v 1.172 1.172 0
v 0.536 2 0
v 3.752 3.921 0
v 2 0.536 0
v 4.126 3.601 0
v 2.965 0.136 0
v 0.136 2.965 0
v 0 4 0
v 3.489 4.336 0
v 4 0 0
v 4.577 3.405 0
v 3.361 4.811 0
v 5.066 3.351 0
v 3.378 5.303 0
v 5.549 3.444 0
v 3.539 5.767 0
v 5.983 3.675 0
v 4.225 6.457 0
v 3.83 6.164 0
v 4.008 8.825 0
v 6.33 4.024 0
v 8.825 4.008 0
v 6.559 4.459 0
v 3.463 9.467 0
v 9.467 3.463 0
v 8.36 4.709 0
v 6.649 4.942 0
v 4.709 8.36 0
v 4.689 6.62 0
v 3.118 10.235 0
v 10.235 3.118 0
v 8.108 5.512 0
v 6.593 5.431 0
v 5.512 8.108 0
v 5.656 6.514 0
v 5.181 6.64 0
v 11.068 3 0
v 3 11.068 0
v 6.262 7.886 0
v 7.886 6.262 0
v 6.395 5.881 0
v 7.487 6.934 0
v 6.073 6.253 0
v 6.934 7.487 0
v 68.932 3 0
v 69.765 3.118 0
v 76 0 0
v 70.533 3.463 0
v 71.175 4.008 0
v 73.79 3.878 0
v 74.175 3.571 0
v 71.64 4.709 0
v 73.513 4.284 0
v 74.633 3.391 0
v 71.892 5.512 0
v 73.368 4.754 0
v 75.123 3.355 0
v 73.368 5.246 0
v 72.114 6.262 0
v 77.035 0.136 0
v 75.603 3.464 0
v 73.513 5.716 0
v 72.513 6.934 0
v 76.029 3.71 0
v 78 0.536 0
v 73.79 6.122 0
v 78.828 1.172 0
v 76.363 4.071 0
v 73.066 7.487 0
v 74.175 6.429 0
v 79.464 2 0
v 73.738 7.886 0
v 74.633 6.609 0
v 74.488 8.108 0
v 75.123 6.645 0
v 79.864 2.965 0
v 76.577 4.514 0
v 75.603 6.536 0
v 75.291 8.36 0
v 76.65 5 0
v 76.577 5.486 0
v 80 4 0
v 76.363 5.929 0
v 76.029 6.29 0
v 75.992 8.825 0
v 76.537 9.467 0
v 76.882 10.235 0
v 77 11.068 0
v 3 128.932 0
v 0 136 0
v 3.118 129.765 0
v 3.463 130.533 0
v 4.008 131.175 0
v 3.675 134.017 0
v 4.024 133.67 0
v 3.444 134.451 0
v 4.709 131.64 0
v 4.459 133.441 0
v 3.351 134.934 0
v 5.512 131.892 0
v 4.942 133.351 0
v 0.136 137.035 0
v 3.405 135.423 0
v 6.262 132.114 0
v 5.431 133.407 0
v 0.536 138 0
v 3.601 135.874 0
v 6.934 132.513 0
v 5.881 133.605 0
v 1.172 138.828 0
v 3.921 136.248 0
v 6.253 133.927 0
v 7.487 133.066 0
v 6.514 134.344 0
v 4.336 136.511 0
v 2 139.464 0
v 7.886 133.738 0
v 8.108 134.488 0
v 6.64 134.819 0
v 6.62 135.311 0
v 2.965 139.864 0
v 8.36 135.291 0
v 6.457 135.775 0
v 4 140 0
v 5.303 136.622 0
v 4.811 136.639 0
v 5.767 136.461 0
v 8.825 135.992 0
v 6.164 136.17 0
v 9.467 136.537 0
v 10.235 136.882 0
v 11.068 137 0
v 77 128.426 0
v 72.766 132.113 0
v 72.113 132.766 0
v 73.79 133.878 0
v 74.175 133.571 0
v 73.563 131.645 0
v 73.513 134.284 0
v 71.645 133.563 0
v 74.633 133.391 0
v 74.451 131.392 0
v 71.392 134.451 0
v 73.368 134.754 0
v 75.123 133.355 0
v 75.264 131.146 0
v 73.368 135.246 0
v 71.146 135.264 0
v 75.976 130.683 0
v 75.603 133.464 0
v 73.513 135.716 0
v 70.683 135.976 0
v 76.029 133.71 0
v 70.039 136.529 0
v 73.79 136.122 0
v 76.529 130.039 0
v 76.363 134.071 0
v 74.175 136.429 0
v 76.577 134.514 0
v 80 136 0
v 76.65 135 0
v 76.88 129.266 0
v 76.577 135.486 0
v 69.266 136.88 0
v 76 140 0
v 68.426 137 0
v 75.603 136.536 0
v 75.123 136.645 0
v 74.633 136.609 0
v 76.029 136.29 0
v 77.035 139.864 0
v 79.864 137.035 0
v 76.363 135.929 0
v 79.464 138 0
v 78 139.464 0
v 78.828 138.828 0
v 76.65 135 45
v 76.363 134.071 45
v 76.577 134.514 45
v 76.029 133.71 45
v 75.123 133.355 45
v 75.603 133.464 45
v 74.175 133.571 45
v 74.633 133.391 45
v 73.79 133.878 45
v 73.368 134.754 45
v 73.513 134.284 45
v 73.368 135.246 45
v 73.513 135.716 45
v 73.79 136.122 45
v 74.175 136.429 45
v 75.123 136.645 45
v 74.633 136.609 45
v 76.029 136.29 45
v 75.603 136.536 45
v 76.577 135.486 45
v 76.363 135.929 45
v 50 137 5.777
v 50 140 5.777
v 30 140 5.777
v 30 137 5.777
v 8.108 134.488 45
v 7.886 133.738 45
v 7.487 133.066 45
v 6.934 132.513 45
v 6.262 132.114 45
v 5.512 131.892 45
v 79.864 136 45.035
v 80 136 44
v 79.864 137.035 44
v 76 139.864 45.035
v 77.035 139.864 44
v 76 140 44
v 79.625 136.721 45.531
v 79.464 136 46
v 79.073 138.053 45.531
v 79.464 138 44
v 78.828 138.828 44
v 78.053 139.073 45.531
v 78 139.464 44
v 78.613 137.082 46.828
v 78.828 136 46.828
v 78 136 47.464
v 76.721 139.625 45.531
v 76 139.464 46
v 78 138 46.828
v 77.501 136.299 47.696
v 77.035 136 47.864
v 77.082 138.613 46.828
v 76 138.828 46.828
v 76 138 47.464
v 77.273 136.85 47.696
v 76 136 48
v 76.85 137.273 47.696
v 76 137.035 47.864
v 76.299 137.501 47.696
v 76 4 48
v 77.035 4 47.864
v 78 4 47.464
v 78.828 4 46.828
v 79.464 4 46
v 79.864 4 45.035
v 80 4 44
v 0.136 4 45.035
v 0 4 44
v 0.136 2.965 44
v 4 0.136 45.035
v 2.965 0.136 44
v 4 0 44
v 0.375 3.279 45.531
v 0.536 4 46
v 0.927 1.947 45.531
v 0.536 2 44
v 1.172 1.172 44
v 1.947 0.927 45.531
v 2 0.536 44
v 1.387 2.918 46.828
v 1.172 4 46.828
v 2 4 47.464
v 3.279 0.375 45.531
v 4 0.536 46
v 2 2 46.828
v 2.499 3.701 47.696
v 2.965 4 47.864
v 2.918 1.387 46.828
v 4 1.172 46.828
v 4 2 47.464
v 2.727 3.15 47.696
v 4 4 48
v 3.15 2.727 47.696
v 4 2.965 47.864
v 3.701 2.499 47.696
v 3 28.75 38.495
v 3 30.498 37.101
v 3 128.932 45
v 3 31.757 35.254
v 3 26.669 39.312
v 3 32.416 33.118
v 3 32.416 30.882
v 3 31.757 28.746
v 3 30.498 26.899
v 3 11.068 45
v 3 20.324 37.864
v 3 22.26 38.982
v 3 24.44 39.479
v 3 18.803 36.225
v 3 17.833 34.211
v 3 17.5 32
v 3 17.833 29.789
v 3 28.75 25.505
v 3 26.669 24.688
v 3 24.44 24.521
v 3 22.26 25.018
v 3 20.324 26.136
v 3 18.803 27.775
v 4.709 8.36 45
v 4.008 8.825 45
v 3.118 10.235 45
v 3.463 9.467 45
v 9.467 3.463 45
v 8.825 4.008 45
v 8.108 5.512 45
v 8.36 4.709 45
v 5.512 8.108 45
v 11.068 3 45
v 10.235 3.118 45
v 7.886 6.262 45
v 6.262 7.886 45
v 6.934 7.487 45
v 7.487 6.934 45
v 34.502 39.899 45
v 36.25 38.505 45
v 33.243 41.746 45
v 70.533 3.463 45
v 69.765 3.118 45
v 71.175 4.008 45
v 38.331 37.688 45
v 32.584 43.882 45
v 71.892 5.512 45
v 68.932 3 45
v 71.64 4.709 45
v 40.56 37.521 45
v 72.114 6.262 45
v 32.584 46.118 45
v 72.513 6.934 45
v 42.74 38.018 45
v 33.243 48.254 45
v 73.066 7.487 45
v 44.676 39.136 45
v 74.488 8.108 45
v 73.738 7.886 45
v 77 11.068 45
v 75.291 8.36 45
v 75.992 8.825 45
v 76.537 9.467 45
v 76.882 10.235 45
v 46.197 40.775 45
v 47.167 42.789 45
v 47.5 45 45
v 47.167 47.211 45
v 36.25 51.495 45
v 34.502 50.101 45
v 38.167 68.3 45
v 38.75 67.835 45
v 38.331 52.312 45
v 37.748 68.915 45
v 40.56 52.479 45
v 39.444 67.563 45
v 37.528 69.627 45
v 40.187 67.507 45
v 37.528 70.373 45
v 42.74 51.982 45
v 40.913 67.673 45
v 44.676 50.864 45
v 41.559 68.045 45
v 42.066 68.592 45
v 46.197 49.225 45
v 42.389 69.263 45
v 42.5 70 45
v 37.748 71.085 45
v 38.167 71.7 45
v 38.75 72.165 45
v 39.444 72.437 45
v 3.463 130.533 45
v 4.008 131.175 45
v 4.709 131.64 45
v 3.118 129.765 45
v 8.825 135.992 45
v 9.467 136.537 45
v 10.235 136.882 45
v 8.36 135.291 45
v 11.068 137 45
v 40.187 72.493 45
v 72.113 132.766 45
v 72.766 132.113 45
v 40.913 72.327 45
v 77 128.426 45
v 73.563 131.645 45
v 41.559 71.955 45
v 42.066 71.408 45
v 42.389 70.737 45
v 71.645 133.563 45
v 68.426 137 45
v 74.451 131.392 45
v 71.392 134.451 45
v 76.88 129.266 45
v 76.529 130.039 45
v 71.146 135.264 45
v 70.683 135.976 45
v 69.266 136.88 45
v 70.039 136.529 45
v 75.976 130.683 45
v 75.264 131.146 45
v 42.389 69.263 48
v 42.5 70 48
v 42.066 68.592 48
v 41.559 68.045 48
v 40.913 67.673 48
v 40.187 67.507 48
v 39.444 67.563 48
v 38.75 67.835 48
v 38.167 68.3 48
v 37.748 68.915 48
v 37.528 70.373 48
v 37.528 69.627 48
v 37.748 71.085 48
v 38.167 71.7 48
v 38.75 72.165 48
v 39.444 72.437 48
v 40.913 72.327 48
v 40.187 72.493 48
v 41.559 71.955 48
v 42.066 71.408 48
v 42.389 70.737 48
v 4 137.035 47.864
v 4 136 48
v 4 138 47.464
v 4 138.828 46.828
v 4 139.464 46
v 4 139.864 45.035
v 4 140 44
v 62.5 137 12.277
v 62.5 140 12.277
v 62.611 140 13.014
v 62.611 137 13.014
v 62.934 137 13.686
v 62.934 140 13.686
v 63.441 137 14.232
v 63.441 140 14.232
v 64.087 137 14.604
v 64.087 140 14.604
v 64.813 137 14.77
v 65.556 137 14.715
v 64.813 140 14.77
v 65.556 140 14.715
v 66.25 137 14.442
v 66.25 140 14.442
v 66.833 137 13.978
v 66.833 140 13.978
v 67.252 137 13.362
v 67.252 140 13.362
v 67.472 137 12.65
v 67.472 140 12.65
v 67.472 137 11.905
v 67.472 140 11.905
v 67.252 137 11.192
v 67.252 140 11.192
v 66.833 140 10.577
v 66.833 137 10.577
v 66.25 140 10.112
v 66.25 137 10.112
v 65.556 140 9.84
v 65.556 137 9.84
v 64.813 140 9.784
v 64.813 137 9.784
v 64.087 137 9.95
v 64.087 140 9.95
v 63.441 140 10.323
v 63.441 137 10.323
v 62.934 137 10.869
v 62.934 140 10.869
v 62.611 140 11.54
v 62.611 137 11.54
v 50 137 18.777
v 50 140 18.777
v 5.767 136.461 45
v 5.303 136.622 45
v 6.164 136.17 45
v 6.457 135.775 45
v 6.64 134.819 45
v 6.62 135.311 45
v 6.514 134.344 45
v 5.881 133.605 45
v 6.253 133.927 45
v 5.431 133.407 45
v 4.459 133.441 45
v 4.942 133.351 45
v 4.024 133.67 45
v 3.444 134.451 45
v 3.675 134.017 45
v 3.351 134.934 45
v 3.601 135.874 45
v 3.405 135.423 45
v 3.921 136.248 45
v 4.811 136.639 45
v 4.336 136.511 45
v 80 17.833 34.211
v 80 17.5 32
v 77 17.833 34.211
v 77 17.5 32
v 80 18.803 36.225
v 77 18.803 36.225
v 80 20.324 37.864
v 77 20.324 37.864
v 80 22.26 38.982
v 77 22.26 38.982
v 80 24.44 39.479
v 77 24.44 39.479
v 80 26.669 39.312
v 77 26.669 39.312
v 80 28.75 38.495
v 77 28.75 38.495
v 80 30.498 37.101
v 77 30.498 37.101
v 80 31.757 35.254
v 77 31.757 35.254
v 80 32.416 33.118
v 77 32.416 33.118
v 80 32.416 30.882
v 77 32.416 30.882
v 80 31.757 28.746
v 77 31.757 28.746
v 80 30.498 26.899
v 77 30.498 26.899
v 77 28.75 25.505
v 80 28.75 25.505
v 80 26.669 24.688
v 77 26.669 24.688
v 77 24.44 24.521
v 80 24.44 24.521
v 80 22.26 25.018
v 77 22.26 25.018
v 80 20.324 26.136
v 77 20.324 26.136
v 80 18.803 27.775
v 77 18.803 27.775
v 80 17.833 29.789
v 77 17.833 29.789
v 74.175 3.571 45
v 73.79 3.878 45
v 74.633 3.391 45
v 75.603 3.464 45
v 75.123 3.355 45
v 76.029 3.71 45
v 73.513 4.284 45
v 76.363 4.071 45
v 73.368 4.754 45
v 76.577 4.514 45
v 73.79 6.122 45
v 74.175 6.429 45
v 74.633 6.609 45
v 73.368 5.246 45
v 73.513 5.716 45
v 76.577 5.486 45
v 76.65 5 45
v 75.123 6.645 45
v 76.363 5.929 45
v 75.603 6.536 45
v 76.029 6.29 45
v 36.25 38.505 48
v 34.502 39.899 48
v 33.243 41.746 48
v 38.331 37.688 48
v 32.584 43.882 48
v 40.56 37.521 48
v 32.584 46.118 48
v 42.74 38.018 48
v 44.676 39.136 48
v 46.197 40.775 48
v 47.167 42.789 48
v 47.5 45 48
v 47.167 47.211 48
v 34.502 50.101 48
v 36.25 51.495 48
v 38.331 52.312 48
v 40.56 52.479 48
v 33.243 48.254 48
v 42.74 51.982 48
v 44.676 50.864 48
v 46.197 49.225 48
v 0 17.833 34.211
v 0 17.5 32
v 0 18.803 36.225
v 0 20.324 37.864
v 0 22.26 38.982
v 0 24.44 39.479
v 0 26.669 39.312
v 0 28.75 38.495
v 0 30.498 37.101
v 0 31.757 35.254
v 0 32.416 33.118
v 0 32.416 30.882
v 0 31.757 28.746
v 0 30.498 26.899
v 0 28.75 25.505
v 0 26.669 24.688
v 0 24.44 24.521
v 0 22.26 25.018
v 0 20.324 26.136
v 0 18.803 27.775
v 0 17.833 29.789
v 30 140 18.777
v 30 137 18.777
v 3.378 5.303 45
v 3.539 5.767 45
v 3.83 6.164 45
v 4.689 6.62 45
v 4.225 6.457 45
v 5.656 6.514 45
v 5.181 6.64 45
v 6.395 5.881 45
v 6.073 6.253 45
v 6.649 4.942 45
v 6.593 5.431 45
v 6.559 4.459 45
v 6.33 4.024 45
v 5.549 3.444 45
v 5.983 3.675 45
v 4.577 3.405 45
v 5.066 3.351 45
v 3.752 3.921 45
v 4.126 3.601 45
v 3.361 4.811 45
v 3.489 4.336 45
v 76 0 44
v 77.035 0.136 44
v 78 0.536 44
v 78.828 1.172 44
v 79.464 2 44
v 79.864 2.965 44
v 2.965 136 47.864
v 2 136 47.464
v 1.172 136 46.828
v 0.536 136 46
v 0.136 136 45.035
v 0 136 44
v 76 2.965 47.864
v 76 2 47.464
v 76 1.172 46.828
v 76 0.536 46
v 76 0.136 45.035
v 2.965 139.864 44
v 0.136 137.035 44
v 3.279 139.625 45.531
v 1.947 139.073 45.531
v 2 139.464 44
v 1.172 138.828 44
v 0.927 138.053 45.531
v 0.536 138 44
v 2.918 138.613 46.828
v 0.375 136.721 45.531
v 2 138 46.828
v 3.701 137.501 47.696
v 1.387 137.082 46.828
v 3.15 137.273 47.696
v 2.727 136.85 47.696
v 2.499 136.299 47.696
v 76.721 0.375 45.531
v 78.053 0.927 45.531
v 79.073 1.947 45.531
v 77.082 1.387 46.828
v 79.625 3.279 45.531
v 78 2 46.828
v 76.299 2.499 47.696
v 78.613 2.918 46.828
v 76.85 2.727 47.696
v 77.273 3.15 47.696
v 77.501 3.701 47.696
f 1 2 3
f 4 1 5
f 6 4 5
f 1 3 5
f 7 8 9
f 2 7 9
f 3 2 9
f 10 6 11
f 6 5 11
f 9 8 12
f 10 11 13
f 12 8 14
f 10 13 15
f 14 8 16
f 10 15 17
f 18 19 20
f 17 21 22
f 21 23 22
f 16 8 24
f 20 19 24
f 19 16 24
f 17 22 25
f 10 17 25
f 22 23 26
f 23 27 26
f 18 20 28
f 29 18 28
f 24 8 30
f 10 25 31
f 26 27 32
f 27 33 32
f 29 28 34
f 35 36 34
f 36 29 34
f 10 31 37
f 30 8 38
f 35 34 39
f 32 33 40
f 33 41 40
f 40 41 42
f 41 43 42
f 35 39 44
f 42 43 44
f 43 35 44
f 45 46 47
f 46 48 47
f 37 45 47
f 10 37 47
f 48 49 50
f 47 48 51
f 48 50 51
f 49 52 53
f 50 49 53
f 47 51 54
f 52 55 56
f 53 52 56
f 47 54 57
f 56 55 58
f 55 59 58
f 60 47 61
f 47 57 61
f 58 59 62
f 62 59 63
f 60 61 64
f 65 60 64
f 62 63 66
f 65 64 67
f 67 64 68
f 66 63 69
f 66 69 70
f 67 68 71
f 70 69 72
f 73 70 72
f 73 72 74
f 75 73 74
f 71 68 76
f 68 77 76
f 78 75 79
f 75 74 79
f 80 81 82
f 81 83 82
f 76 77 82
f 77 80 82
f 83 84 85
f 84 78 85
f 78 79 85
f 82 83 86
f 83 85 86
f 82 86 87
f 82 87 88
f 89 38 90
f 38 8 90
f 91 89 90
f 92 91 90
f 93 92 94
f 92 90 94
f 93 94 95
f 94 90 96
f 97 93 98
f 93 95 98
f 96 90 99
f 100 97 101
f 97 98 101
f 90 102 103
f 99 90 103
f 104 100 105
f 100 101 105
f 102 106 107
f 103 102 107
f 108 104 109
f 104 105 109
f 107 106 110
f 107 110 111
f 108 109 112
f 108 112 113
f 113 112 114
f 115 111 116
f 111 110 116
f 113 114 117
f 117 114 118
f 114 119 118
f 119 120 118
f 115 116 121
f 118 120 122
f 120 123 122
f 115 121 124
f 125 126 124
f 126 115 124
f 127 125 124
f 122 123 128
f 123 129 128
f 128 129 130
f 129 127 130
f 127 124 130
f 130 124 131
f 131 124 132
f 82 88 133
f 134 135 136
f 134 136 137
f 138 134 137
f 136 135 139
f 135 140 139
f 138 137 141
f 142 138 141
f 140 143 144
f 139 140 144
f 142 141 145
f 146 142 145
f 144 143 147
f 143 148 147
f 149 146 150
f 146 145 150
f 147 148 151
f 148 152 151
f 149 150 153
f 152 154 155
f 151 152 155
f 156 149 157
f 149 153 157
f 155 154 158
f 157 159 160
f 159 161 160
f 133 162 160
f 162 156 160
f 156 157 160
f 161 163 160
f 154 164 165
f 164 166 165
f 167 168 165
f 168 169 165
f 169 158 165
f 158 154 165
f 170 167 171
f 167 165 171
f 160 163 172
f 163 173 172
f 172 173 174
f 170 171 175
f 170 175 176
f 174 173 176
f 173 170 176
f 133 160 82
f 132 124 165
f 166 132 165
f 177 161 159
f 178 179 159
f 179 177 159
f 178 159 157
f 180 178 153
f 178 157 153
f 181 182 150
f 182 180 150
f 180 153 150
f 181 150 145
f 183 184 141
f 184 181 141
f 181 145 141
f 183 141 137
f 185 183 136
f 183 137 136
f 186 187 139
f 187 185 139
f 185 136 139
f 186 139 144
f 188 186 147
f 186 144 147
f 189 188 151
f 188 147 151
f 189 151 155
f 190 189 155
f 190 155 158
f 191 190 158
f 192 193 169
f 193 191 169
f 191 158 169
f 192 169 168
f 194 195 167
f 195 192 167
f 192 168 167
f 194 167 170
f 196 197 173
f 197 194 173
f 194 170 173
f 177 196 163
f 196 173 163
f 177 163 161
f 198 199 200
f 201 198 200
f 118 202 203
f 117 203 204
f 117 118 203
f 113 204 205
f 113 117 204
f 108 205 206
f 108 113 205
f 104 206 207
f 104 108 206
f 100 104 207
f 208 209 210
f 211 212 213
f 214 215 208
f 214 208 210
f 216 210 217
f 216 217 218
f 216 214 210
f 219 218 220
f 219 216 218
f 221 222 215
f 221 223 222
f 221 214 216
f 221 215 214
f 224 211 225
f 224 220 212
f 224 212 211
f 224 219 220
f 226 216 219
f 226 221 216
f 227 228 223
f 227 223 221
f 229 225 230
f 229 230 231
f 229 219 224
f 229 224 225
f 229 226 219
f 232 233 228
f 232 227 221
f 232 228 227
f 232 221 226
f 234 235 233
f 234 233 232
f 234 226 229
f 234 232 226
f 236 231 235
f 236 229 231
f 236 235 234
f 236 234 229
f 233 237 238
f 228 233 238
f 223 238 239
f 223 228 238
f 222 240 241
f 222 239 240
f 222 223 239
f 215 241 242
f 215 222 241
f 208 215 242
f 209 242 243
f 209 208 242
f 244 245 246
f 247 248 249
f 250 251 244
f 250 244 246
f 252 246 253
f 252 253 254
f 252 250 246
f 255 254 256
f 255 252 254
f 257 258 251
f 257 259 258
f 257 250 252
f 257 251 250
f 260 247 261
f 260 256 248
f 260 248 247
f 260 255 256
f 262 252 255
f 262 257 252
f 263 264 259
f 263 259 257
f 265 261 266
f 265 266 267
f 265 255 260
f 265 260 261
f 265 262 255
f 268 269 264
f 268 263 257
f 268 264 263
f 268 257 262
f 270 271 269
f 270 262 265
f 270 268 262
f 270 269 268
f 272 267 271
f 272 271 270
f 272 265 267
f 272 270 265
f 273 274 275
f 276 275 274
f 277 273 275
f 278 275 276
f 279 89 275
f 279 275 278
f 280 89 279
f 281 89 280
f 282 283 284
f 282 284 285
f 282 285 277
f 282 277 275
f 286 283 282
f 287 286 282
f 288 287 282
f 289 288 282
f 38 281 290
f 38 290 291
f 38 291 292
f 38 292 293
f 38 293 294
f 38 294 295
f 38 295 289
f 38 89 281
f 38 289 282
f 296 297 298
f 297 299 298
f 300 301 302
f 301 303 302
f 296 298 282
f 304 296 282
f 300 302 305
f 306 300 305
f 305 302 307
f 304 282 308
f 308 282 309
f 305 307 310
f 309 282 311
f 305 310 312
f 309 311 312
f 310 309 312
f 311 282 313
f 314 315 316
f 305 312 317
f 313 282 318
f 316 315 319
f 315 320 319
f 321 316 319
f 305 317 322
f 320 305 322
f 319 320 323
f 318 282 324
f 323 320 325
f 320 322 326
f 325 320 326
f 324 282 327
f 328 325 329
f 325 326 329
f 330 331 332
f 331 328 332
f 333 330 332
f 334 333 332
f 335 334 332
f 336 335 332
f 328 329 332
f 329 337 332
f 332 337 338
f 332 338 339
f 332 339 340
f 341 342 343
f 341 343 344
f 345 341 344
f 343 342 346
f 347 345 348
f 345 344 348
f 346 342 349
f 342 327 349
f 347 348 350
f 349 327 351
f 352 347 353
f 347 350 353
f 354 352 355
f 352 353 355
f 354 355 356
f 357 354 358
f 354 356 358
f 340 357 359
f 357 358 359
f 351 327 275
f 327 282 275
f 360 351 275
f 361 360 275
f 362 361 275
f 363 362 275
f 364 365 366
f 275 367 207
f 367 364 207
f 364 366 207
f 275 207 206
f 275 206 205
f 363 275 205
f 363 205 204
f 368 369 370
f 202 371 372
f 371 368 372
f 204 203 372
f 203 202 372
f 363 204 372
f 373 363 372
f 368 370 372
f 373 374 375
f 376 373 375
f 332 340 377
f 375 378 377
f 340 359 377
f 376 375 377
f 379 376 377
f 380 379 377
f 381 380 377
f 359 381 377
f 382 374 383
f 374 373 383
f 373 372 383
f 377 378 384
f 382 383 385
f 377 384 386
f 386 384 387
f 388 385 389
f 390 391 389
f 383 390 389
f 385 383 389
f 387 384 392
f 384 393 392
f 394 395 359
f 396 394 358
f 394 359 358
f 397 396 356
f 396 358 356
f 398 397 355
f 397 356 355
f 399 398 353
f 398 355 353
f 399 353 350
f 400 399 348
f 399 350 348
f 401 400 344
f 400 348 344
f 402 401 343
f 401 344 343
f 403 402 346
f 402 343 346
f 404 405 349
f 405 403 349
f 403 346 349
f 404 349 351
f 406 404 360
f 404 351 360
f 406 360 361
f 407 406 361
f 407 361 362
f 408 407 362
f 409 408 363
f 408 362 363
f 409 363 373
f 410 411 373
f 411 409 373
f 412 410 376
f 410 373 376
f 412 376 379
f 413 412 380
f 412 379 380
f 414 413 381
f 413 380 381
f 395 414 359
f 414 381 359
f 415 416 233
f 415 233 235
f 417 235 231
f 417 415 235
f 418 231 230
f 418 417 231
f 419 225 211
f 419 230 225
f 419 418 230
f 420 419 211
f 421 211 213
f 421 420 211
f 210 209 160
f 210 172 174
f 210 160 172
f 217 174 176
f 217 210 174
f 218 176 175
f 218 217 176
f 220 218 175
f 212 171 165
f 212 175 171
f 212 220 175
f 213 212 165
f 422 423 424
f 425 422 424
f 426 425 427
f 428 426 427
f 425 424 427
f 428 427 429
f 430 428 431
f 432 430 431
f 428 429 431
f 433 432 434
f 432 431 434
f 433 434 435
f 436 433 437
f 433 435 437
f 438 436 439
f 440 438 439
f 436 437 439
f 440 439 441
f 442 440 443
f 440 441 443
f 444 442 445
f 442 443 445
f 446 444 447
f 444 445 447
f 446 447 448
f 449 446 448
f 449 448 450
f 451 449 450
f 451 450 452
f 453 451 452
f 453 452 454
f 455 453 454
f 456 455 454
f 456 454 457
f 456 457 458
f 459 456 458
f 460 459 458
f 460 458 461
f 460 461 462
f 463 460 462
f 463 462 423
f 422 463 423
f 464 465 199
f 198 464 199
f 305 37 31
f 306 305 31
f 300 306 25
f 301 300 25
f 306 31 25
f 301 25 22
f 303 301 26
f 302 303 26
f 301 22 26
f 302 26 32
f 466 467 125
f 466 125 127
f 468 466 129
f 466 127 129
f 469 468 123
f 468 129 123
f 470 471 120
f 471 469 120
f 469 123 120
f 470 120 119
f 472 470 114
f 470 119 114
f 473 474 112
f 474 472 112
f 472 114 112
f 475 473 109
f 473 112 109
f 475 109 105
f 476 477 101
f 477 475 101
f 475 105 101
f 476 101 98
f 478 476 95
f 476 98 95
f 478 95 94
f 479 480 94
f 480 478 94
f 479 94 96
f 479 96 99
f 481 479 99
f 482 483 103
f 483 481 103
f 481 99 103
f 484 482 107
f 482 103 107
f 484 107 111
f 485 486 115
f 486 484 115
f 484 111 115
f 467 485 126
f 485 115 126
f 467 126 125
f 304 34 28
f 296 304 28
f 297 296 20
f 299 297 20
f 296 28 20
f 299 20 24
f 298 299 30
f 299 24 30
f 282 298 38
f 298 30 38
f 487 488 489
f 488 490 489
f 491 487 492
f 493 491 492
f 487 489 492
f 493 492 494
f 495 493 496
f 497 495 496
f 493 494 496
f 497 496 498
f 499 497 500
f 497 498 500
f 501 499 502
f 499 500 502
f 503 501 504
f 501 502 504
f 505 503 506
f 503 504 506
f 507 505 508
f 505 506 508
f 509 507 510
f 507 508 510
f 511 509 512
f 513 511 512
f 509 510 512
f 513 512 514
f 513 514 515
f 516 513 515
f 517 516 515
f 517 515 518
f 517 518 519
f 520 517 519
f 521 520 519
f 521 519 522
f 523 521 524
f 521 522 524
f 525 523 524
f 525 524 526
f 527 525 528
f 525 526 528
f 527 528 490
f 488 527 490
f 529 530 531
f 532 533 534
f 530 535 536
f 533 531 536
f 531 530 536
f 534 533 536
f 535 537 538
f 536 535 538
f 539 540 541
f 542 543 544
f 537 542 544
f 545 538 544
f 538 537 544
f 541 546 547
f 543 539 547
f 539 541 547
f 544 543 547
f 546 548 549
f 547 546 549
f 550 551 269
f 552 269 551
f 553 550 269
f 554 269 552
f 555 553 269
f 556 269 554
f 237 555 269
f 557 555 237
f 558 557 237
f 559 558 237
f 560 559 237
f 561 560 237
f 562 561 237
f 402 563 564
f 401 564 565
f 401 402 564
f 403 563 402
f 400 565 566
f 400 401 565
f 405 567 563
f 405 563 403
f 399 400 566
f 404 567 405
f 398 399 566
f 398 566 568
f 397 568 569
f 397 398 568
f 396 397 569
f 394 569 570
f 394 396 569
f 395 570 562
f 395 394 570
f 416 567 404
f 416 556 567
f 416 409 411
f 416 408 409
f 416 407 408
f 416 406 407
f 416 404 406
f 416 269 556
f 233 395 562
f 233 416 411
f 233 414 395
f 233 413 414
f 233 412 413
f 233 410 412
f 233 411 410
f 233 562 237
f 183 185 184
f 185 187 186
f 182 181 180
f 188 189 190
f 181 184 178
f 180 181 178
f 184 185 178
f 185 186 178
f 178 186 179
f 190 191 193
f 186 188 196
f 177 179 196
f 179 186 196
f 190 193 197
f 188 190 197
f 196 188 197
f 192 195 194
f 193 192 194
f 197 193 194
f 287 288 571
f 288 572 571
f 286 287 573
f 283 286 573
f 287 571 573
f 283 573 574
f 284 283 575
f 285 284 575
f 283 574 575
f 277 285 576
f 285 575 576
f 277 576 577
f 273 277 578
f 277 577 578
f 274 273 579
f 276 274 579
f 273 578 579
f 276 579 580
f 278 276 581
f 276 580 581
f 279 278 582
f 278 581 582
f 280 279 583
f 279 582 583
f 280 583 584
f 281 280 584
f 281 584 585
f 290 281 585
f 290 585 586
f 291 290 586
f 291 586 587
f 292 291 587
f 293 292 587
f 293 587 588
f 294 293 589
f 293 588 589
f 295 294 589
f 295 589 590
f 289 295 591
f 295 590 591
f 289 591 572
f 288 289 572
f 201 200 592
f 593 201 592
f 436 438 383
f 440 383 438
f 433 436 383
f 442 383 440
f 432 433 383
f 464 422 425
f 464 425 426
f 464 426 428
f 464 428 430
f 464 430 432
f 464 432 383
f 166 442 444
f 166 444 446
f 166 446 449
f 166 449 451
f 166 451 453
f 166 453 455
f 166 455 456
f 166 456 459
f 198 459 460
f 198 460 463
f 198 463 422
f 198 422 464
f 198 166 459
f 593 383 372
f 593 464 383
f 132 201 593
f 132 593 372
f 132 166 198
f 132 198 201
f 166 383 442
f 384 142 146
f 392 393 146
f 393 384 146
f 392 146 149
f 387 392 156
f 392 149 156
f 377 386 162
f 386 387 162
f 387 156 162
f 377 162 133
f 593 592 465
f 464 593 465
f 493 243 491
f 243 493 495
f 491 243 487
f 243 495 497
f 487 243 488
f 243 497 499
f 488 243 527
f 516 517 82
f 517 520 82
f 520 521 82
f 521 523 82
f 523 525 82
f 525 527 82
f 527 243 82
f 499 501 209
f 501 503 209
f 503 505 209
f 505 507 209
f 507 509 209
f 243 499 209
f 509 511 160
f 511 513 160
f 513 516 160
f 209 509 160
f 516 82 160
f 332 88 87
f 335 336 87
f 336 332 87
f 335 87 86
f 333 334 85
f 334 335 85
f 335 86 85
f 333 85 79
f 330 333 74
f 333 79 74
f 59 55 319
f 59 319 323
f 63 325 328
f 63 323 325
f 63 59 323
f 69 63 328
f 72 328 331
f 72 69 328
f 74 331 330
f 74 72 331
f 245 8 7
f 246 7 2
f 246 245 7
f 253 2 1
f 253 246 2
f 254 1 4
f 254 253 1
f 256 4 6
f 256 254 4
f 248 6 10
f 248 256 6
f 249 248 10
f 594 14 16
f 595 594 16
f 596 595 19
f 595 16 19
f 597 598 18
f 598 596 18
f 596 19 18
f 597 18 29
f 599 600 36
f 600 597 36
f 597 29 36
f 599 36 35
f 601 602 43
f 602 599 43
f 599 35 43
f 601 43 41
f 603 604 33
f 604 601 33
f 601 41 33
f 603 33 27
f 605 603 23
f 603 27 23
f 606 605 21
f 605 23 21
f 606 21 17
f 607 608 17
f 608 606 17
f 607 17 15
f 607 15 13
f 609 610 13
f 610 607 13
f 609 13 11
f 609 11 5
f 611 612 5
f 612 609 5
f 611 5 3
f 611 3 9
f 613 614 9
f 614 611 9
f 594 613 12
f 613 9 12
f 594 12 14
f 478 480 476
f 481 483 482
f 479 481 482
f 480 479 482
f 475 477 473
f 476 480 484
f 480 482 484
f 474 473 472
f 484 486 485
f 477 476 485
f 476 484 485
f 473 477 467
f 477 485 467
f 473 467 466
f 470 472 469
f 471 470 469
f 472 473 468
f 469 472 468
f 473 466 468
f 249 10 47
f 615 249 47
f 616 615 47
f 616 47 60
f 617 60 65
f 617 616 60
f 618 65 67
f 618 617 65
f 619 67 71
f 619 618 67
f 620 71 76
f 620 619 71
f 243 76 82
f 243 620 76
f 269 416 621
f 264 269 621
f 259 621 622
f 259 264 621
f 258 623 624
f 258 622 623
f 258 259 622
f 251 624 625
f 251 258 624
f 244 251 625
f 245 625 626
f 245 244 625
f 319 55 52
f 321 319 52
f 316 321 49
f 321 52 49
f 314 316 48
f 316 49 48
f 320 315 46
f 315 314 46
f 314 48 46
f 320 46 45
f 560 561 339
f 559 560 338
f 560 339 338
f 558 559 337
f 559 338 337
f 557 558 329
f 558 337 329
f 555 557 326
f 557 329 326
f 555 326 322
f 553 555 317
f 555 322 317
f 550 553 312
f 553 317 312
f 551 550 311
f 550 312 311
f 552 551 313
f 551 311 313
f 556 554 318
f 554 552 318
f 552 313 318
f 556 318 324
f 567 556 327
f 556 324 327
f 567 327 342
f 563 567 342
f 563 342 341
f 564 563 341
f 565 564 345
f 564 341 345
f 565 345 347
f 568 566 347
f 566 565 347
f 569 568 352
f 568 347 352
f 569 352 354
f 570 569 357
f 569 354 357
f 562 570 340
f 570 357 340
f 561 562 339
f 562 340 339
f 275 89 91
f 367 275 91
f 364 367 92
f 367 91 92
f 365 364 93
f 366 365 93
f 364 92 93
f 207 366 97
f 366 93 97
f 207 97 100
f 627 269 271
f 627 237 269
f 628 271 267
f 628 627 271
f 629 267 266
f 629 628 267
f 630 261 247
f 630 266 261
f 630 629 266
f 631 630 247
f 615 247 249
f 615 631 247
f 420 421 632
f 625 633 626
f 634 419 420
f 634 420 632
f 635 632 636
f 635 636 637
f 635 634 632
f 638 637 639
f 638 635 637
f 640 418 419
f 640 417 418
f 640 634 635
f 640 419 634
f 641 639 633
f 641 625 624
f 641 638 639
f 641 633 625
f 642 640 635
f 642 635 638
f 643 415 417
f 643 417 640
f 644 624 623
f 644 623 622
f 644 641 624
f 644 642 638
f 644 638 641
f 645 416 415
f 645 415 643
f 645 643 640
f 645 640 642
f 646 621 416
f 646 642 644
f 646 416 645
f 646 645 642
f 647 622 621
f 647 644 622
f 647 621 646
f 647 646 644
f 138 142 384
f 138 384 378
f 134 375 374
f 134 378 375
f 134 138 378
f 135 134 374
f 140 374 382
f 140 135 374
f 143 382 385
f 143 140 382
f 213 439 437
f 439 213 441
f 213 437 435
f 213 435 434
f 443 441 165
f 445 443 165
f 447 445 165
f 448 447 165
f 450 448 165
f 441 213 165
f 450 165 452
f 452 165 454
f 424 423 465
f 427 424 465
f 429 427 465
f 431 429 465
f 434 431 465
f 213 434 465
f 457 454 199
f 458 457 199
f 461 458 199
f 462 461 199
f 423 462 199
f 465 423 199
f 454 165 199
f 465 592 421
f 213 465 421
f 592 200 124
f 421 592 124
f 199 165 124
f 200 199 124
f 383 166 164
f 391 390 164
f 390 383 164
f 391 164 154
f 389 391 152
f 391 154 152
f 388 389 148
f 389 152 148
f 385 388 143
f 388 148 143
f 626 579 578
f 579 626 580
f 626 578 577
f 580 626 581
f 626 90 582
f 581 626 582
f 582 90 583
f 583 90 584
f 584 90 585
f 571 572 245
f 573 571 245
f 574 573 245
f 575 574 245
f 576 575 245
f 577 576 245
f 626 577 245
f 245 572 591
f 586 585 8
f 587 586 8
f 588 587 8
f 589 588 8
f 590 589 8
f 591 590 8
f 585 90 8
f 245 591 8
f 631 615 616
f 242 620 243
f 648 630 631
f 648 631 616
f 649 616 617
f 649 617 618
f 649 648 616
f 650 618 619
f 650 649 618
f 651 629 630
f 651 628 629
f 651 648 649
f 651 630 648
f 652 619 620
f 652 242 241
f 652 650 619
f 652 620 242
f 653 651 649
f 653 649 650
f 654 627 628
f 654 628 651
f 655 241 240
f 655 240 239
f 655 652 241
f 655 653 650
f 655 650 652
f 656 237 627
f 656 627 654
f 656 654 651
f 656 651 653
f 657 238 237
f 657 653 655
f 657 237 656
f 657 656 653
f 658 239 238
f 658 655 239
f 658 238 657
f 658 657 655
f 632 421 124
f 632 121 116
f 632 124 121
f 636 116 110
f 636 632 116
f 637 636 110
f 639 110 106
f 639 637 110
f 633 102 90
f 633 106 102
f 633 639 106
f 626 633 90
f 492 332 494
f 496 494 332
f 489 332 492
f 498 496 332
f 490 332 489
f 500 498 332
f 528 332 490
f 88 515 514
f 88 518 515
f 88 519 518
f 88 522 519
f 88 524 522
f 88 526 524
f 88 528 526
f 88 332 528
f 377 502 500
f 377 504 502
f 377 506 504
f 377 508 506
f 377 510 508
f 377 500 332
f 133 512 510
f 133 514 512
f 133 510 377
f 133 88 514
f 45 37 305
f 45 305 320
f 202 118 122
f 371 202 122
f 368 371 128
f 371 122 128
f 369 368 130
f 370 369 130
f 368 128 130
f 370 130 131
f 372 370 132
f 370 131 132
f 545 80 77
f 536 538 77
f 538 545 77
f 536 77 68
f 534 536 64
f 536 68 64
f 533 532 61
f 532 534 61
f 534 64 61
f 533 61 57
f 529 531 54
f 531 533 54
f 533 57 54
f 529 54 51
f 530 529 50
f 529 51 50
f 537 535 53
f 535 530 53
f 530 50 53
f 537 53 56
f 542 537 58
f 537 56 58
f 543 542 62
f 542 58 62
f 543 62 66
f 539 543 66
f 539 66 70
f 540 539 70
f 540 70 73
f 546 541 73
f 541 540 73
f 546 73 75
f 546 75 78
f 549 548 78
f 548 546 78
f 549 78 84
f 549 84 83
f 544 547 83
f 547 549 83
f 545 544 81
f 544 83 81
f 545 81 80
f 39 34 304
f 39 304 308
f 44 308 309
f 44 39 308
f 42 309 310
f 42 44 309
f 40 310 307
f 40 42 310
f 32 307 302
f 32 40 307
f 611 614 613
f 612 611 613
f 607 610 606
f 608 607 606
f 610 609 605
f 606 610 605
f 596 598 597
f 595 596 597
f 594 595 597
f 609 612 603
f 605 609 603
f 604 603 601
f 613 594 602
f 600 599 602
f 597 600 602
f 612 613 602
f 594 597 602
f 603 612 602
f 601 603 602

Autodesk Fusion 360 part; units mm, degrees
sketch "Sketch1" plane through (0, 0, 0) normal (0, 0, 1) x (1, 0, 0)
  line L0 (0, 0) -> (80, 0)
  line L1 (80, 0) -> (80, 140)
  line L2 (80, 140) -> (0, 140)
  line L3 (0, 140) -> (0, 0)
  line L4 (40, 140) -> (40, 0) construction
  circle A0 centre (40, 45) radius 7.5
  line L5 (5, 5) -> (75, 5) construction
  line L6 (75, 5) -> (75, 135) construction
  line L7 (75, 135) -> (5, 135) construction
  line L8 (5, 135) -> (5, 5) construction
  circle A1 centre (75, 135) radius 1.65
  circle A2 centre (5, 135) radius 1.65
  circle A3 centre (75, 5) radius 1.65
  circle A4 centre (5, 5) radius 1.65
  circle A5 centre (75, 5) radius 3.15
  circle A6 centre (5, 5) radius 3.15
  circle A7 centre (5, 135) radius 3.15
  circle A8 centre (75, 135) radius 3.65
  circle A9 centre (40, 70) radius 2.5
  dimension "d1" = 80
  dimension "d2" = 140
  dimension "d3" = 15
  dimension "d13" = -5
  dimension "d14" = 3.3
  dimension "d15" = 3.3
  dimension "d16" = 3.3
  dimension "d17" = 3.3
  dimension "d18" = 1.5
  dimension "d19" = 1.5
  dimension "d20" = 1.5
  dimension "d21" = 2
  dimension "d38" = 45
  dimension "d40" = 5
  dimension "d41" = 25
extrude "Extrude1" add sketch "Sketch1" along normal blind 48 contours L0 L1 L2 L3 | A0 | A1 | A2 | A3 | A4 | A5 | A6 | A7 | A8 | A9
shell "Shell1" thickness 3 removed faces 1 at (26.6667, 46.6667, 0)
extrude "Footswitch hole" cut sketch "Sketch1" along normal up to surface (48 mm away) contours A0 | A9
sketch "Sketch3" plane through (0, 0, 0) normal (-1, 0, 0) x (0, -1, 0)
  line L0 (-140, 0) -> (0, 0)
  line L1 (0, 0) -> (0, 48)
  line L2 (0, 48) -> (-140, 48)
  line L3 (-140, 48) -> (-140, 0)
  line L4 (-130, 32) -> (0, 32) construction
  circle A0 centre (-25, 32) radius 7.5
  dimension "d28" = 15
  dimension "d37" = 25
  dimension "d39" = 16
extrude "Extrude5" cut sketch "Sketch3" against normal up to surface (80 mm away) contours A0
fillet "Fillet1" radius 4 8 edges at (0, 0, 24) (3, 3, 22.5) (80, 0, 24) (77, 3, 22.5) (0, 140, 24) (3, 137, 22.5) (77, 137, 22.5) (80, 140, 24)
fillet "Fillets" radius 4 8 edges at (1.1716, 1.1716, 48) (40, 0, 48) (78.8284, 1.1716, 48) (80, 70, 48) (78.8284, 138.8284, 48) (40, 140, 48) (1.1716, 138.8284, 48) (0, 70, 48)
extrude "Extrude3" add sketch "Sketch1" along normal up to surface (45 mm away) contours A5 | A6 | A7 | A8
extrude "Extrude4" cut sketch "Sketch1" along normal up to surface (45 mm away) contours A1 | A2 | A3 | A4
fillet "Fillet3" radius 3 8 edges at (72.5664, 3, 22.5) (77, 7.4336, 22.5) (3, 7.4336, 22.5) (7.4336, 3, 22.5) (7.4336, 137, 22.5) (3, 132.5664, 22.5) (77, 131.9467, 22.5) (71.9467, 137, 22.5)
sketch "Sketch4" plane through (0, 140, 0) normal (0, 1, 0) x (-1, 0, 0)
  line L0 (-4, 44) -> (-76, 44)
  line L1 (-76, 44) -> (-76, 0)
  line L2 (-76, 0) -> (-4, 0)
  line L3 (-4, 0) -> (-4, 44)
  line L4 (-30, 18.7772) -> (-50, 18.7772)
  line L5 (-50, 18.7772) -> (-50, 5.7772)
  line L6 (-50, 5.7772) -> (-30, 5.7772)
  line L7 (-30, 5.7772) -> (-30, 18.7772)
  line L8 (-40, 44) -> (-40, 0) construction
  line L9 (-30, 12.2772) -> (-65, 12.2772) construction
  circle A0 centre (-65, 12.2772) radius 2.5
  dimension "d31" = 20
  dimension "d32" = 13
  dimension "d42" = 5
  dimension "d43" = 15
extrude "Extrude6" cut sketch "Sketch4" against normal up to surface (3 mm away) contours L4 L5 L6 L7 | A0
equation "d38 = 35 mm + 10 mm"
